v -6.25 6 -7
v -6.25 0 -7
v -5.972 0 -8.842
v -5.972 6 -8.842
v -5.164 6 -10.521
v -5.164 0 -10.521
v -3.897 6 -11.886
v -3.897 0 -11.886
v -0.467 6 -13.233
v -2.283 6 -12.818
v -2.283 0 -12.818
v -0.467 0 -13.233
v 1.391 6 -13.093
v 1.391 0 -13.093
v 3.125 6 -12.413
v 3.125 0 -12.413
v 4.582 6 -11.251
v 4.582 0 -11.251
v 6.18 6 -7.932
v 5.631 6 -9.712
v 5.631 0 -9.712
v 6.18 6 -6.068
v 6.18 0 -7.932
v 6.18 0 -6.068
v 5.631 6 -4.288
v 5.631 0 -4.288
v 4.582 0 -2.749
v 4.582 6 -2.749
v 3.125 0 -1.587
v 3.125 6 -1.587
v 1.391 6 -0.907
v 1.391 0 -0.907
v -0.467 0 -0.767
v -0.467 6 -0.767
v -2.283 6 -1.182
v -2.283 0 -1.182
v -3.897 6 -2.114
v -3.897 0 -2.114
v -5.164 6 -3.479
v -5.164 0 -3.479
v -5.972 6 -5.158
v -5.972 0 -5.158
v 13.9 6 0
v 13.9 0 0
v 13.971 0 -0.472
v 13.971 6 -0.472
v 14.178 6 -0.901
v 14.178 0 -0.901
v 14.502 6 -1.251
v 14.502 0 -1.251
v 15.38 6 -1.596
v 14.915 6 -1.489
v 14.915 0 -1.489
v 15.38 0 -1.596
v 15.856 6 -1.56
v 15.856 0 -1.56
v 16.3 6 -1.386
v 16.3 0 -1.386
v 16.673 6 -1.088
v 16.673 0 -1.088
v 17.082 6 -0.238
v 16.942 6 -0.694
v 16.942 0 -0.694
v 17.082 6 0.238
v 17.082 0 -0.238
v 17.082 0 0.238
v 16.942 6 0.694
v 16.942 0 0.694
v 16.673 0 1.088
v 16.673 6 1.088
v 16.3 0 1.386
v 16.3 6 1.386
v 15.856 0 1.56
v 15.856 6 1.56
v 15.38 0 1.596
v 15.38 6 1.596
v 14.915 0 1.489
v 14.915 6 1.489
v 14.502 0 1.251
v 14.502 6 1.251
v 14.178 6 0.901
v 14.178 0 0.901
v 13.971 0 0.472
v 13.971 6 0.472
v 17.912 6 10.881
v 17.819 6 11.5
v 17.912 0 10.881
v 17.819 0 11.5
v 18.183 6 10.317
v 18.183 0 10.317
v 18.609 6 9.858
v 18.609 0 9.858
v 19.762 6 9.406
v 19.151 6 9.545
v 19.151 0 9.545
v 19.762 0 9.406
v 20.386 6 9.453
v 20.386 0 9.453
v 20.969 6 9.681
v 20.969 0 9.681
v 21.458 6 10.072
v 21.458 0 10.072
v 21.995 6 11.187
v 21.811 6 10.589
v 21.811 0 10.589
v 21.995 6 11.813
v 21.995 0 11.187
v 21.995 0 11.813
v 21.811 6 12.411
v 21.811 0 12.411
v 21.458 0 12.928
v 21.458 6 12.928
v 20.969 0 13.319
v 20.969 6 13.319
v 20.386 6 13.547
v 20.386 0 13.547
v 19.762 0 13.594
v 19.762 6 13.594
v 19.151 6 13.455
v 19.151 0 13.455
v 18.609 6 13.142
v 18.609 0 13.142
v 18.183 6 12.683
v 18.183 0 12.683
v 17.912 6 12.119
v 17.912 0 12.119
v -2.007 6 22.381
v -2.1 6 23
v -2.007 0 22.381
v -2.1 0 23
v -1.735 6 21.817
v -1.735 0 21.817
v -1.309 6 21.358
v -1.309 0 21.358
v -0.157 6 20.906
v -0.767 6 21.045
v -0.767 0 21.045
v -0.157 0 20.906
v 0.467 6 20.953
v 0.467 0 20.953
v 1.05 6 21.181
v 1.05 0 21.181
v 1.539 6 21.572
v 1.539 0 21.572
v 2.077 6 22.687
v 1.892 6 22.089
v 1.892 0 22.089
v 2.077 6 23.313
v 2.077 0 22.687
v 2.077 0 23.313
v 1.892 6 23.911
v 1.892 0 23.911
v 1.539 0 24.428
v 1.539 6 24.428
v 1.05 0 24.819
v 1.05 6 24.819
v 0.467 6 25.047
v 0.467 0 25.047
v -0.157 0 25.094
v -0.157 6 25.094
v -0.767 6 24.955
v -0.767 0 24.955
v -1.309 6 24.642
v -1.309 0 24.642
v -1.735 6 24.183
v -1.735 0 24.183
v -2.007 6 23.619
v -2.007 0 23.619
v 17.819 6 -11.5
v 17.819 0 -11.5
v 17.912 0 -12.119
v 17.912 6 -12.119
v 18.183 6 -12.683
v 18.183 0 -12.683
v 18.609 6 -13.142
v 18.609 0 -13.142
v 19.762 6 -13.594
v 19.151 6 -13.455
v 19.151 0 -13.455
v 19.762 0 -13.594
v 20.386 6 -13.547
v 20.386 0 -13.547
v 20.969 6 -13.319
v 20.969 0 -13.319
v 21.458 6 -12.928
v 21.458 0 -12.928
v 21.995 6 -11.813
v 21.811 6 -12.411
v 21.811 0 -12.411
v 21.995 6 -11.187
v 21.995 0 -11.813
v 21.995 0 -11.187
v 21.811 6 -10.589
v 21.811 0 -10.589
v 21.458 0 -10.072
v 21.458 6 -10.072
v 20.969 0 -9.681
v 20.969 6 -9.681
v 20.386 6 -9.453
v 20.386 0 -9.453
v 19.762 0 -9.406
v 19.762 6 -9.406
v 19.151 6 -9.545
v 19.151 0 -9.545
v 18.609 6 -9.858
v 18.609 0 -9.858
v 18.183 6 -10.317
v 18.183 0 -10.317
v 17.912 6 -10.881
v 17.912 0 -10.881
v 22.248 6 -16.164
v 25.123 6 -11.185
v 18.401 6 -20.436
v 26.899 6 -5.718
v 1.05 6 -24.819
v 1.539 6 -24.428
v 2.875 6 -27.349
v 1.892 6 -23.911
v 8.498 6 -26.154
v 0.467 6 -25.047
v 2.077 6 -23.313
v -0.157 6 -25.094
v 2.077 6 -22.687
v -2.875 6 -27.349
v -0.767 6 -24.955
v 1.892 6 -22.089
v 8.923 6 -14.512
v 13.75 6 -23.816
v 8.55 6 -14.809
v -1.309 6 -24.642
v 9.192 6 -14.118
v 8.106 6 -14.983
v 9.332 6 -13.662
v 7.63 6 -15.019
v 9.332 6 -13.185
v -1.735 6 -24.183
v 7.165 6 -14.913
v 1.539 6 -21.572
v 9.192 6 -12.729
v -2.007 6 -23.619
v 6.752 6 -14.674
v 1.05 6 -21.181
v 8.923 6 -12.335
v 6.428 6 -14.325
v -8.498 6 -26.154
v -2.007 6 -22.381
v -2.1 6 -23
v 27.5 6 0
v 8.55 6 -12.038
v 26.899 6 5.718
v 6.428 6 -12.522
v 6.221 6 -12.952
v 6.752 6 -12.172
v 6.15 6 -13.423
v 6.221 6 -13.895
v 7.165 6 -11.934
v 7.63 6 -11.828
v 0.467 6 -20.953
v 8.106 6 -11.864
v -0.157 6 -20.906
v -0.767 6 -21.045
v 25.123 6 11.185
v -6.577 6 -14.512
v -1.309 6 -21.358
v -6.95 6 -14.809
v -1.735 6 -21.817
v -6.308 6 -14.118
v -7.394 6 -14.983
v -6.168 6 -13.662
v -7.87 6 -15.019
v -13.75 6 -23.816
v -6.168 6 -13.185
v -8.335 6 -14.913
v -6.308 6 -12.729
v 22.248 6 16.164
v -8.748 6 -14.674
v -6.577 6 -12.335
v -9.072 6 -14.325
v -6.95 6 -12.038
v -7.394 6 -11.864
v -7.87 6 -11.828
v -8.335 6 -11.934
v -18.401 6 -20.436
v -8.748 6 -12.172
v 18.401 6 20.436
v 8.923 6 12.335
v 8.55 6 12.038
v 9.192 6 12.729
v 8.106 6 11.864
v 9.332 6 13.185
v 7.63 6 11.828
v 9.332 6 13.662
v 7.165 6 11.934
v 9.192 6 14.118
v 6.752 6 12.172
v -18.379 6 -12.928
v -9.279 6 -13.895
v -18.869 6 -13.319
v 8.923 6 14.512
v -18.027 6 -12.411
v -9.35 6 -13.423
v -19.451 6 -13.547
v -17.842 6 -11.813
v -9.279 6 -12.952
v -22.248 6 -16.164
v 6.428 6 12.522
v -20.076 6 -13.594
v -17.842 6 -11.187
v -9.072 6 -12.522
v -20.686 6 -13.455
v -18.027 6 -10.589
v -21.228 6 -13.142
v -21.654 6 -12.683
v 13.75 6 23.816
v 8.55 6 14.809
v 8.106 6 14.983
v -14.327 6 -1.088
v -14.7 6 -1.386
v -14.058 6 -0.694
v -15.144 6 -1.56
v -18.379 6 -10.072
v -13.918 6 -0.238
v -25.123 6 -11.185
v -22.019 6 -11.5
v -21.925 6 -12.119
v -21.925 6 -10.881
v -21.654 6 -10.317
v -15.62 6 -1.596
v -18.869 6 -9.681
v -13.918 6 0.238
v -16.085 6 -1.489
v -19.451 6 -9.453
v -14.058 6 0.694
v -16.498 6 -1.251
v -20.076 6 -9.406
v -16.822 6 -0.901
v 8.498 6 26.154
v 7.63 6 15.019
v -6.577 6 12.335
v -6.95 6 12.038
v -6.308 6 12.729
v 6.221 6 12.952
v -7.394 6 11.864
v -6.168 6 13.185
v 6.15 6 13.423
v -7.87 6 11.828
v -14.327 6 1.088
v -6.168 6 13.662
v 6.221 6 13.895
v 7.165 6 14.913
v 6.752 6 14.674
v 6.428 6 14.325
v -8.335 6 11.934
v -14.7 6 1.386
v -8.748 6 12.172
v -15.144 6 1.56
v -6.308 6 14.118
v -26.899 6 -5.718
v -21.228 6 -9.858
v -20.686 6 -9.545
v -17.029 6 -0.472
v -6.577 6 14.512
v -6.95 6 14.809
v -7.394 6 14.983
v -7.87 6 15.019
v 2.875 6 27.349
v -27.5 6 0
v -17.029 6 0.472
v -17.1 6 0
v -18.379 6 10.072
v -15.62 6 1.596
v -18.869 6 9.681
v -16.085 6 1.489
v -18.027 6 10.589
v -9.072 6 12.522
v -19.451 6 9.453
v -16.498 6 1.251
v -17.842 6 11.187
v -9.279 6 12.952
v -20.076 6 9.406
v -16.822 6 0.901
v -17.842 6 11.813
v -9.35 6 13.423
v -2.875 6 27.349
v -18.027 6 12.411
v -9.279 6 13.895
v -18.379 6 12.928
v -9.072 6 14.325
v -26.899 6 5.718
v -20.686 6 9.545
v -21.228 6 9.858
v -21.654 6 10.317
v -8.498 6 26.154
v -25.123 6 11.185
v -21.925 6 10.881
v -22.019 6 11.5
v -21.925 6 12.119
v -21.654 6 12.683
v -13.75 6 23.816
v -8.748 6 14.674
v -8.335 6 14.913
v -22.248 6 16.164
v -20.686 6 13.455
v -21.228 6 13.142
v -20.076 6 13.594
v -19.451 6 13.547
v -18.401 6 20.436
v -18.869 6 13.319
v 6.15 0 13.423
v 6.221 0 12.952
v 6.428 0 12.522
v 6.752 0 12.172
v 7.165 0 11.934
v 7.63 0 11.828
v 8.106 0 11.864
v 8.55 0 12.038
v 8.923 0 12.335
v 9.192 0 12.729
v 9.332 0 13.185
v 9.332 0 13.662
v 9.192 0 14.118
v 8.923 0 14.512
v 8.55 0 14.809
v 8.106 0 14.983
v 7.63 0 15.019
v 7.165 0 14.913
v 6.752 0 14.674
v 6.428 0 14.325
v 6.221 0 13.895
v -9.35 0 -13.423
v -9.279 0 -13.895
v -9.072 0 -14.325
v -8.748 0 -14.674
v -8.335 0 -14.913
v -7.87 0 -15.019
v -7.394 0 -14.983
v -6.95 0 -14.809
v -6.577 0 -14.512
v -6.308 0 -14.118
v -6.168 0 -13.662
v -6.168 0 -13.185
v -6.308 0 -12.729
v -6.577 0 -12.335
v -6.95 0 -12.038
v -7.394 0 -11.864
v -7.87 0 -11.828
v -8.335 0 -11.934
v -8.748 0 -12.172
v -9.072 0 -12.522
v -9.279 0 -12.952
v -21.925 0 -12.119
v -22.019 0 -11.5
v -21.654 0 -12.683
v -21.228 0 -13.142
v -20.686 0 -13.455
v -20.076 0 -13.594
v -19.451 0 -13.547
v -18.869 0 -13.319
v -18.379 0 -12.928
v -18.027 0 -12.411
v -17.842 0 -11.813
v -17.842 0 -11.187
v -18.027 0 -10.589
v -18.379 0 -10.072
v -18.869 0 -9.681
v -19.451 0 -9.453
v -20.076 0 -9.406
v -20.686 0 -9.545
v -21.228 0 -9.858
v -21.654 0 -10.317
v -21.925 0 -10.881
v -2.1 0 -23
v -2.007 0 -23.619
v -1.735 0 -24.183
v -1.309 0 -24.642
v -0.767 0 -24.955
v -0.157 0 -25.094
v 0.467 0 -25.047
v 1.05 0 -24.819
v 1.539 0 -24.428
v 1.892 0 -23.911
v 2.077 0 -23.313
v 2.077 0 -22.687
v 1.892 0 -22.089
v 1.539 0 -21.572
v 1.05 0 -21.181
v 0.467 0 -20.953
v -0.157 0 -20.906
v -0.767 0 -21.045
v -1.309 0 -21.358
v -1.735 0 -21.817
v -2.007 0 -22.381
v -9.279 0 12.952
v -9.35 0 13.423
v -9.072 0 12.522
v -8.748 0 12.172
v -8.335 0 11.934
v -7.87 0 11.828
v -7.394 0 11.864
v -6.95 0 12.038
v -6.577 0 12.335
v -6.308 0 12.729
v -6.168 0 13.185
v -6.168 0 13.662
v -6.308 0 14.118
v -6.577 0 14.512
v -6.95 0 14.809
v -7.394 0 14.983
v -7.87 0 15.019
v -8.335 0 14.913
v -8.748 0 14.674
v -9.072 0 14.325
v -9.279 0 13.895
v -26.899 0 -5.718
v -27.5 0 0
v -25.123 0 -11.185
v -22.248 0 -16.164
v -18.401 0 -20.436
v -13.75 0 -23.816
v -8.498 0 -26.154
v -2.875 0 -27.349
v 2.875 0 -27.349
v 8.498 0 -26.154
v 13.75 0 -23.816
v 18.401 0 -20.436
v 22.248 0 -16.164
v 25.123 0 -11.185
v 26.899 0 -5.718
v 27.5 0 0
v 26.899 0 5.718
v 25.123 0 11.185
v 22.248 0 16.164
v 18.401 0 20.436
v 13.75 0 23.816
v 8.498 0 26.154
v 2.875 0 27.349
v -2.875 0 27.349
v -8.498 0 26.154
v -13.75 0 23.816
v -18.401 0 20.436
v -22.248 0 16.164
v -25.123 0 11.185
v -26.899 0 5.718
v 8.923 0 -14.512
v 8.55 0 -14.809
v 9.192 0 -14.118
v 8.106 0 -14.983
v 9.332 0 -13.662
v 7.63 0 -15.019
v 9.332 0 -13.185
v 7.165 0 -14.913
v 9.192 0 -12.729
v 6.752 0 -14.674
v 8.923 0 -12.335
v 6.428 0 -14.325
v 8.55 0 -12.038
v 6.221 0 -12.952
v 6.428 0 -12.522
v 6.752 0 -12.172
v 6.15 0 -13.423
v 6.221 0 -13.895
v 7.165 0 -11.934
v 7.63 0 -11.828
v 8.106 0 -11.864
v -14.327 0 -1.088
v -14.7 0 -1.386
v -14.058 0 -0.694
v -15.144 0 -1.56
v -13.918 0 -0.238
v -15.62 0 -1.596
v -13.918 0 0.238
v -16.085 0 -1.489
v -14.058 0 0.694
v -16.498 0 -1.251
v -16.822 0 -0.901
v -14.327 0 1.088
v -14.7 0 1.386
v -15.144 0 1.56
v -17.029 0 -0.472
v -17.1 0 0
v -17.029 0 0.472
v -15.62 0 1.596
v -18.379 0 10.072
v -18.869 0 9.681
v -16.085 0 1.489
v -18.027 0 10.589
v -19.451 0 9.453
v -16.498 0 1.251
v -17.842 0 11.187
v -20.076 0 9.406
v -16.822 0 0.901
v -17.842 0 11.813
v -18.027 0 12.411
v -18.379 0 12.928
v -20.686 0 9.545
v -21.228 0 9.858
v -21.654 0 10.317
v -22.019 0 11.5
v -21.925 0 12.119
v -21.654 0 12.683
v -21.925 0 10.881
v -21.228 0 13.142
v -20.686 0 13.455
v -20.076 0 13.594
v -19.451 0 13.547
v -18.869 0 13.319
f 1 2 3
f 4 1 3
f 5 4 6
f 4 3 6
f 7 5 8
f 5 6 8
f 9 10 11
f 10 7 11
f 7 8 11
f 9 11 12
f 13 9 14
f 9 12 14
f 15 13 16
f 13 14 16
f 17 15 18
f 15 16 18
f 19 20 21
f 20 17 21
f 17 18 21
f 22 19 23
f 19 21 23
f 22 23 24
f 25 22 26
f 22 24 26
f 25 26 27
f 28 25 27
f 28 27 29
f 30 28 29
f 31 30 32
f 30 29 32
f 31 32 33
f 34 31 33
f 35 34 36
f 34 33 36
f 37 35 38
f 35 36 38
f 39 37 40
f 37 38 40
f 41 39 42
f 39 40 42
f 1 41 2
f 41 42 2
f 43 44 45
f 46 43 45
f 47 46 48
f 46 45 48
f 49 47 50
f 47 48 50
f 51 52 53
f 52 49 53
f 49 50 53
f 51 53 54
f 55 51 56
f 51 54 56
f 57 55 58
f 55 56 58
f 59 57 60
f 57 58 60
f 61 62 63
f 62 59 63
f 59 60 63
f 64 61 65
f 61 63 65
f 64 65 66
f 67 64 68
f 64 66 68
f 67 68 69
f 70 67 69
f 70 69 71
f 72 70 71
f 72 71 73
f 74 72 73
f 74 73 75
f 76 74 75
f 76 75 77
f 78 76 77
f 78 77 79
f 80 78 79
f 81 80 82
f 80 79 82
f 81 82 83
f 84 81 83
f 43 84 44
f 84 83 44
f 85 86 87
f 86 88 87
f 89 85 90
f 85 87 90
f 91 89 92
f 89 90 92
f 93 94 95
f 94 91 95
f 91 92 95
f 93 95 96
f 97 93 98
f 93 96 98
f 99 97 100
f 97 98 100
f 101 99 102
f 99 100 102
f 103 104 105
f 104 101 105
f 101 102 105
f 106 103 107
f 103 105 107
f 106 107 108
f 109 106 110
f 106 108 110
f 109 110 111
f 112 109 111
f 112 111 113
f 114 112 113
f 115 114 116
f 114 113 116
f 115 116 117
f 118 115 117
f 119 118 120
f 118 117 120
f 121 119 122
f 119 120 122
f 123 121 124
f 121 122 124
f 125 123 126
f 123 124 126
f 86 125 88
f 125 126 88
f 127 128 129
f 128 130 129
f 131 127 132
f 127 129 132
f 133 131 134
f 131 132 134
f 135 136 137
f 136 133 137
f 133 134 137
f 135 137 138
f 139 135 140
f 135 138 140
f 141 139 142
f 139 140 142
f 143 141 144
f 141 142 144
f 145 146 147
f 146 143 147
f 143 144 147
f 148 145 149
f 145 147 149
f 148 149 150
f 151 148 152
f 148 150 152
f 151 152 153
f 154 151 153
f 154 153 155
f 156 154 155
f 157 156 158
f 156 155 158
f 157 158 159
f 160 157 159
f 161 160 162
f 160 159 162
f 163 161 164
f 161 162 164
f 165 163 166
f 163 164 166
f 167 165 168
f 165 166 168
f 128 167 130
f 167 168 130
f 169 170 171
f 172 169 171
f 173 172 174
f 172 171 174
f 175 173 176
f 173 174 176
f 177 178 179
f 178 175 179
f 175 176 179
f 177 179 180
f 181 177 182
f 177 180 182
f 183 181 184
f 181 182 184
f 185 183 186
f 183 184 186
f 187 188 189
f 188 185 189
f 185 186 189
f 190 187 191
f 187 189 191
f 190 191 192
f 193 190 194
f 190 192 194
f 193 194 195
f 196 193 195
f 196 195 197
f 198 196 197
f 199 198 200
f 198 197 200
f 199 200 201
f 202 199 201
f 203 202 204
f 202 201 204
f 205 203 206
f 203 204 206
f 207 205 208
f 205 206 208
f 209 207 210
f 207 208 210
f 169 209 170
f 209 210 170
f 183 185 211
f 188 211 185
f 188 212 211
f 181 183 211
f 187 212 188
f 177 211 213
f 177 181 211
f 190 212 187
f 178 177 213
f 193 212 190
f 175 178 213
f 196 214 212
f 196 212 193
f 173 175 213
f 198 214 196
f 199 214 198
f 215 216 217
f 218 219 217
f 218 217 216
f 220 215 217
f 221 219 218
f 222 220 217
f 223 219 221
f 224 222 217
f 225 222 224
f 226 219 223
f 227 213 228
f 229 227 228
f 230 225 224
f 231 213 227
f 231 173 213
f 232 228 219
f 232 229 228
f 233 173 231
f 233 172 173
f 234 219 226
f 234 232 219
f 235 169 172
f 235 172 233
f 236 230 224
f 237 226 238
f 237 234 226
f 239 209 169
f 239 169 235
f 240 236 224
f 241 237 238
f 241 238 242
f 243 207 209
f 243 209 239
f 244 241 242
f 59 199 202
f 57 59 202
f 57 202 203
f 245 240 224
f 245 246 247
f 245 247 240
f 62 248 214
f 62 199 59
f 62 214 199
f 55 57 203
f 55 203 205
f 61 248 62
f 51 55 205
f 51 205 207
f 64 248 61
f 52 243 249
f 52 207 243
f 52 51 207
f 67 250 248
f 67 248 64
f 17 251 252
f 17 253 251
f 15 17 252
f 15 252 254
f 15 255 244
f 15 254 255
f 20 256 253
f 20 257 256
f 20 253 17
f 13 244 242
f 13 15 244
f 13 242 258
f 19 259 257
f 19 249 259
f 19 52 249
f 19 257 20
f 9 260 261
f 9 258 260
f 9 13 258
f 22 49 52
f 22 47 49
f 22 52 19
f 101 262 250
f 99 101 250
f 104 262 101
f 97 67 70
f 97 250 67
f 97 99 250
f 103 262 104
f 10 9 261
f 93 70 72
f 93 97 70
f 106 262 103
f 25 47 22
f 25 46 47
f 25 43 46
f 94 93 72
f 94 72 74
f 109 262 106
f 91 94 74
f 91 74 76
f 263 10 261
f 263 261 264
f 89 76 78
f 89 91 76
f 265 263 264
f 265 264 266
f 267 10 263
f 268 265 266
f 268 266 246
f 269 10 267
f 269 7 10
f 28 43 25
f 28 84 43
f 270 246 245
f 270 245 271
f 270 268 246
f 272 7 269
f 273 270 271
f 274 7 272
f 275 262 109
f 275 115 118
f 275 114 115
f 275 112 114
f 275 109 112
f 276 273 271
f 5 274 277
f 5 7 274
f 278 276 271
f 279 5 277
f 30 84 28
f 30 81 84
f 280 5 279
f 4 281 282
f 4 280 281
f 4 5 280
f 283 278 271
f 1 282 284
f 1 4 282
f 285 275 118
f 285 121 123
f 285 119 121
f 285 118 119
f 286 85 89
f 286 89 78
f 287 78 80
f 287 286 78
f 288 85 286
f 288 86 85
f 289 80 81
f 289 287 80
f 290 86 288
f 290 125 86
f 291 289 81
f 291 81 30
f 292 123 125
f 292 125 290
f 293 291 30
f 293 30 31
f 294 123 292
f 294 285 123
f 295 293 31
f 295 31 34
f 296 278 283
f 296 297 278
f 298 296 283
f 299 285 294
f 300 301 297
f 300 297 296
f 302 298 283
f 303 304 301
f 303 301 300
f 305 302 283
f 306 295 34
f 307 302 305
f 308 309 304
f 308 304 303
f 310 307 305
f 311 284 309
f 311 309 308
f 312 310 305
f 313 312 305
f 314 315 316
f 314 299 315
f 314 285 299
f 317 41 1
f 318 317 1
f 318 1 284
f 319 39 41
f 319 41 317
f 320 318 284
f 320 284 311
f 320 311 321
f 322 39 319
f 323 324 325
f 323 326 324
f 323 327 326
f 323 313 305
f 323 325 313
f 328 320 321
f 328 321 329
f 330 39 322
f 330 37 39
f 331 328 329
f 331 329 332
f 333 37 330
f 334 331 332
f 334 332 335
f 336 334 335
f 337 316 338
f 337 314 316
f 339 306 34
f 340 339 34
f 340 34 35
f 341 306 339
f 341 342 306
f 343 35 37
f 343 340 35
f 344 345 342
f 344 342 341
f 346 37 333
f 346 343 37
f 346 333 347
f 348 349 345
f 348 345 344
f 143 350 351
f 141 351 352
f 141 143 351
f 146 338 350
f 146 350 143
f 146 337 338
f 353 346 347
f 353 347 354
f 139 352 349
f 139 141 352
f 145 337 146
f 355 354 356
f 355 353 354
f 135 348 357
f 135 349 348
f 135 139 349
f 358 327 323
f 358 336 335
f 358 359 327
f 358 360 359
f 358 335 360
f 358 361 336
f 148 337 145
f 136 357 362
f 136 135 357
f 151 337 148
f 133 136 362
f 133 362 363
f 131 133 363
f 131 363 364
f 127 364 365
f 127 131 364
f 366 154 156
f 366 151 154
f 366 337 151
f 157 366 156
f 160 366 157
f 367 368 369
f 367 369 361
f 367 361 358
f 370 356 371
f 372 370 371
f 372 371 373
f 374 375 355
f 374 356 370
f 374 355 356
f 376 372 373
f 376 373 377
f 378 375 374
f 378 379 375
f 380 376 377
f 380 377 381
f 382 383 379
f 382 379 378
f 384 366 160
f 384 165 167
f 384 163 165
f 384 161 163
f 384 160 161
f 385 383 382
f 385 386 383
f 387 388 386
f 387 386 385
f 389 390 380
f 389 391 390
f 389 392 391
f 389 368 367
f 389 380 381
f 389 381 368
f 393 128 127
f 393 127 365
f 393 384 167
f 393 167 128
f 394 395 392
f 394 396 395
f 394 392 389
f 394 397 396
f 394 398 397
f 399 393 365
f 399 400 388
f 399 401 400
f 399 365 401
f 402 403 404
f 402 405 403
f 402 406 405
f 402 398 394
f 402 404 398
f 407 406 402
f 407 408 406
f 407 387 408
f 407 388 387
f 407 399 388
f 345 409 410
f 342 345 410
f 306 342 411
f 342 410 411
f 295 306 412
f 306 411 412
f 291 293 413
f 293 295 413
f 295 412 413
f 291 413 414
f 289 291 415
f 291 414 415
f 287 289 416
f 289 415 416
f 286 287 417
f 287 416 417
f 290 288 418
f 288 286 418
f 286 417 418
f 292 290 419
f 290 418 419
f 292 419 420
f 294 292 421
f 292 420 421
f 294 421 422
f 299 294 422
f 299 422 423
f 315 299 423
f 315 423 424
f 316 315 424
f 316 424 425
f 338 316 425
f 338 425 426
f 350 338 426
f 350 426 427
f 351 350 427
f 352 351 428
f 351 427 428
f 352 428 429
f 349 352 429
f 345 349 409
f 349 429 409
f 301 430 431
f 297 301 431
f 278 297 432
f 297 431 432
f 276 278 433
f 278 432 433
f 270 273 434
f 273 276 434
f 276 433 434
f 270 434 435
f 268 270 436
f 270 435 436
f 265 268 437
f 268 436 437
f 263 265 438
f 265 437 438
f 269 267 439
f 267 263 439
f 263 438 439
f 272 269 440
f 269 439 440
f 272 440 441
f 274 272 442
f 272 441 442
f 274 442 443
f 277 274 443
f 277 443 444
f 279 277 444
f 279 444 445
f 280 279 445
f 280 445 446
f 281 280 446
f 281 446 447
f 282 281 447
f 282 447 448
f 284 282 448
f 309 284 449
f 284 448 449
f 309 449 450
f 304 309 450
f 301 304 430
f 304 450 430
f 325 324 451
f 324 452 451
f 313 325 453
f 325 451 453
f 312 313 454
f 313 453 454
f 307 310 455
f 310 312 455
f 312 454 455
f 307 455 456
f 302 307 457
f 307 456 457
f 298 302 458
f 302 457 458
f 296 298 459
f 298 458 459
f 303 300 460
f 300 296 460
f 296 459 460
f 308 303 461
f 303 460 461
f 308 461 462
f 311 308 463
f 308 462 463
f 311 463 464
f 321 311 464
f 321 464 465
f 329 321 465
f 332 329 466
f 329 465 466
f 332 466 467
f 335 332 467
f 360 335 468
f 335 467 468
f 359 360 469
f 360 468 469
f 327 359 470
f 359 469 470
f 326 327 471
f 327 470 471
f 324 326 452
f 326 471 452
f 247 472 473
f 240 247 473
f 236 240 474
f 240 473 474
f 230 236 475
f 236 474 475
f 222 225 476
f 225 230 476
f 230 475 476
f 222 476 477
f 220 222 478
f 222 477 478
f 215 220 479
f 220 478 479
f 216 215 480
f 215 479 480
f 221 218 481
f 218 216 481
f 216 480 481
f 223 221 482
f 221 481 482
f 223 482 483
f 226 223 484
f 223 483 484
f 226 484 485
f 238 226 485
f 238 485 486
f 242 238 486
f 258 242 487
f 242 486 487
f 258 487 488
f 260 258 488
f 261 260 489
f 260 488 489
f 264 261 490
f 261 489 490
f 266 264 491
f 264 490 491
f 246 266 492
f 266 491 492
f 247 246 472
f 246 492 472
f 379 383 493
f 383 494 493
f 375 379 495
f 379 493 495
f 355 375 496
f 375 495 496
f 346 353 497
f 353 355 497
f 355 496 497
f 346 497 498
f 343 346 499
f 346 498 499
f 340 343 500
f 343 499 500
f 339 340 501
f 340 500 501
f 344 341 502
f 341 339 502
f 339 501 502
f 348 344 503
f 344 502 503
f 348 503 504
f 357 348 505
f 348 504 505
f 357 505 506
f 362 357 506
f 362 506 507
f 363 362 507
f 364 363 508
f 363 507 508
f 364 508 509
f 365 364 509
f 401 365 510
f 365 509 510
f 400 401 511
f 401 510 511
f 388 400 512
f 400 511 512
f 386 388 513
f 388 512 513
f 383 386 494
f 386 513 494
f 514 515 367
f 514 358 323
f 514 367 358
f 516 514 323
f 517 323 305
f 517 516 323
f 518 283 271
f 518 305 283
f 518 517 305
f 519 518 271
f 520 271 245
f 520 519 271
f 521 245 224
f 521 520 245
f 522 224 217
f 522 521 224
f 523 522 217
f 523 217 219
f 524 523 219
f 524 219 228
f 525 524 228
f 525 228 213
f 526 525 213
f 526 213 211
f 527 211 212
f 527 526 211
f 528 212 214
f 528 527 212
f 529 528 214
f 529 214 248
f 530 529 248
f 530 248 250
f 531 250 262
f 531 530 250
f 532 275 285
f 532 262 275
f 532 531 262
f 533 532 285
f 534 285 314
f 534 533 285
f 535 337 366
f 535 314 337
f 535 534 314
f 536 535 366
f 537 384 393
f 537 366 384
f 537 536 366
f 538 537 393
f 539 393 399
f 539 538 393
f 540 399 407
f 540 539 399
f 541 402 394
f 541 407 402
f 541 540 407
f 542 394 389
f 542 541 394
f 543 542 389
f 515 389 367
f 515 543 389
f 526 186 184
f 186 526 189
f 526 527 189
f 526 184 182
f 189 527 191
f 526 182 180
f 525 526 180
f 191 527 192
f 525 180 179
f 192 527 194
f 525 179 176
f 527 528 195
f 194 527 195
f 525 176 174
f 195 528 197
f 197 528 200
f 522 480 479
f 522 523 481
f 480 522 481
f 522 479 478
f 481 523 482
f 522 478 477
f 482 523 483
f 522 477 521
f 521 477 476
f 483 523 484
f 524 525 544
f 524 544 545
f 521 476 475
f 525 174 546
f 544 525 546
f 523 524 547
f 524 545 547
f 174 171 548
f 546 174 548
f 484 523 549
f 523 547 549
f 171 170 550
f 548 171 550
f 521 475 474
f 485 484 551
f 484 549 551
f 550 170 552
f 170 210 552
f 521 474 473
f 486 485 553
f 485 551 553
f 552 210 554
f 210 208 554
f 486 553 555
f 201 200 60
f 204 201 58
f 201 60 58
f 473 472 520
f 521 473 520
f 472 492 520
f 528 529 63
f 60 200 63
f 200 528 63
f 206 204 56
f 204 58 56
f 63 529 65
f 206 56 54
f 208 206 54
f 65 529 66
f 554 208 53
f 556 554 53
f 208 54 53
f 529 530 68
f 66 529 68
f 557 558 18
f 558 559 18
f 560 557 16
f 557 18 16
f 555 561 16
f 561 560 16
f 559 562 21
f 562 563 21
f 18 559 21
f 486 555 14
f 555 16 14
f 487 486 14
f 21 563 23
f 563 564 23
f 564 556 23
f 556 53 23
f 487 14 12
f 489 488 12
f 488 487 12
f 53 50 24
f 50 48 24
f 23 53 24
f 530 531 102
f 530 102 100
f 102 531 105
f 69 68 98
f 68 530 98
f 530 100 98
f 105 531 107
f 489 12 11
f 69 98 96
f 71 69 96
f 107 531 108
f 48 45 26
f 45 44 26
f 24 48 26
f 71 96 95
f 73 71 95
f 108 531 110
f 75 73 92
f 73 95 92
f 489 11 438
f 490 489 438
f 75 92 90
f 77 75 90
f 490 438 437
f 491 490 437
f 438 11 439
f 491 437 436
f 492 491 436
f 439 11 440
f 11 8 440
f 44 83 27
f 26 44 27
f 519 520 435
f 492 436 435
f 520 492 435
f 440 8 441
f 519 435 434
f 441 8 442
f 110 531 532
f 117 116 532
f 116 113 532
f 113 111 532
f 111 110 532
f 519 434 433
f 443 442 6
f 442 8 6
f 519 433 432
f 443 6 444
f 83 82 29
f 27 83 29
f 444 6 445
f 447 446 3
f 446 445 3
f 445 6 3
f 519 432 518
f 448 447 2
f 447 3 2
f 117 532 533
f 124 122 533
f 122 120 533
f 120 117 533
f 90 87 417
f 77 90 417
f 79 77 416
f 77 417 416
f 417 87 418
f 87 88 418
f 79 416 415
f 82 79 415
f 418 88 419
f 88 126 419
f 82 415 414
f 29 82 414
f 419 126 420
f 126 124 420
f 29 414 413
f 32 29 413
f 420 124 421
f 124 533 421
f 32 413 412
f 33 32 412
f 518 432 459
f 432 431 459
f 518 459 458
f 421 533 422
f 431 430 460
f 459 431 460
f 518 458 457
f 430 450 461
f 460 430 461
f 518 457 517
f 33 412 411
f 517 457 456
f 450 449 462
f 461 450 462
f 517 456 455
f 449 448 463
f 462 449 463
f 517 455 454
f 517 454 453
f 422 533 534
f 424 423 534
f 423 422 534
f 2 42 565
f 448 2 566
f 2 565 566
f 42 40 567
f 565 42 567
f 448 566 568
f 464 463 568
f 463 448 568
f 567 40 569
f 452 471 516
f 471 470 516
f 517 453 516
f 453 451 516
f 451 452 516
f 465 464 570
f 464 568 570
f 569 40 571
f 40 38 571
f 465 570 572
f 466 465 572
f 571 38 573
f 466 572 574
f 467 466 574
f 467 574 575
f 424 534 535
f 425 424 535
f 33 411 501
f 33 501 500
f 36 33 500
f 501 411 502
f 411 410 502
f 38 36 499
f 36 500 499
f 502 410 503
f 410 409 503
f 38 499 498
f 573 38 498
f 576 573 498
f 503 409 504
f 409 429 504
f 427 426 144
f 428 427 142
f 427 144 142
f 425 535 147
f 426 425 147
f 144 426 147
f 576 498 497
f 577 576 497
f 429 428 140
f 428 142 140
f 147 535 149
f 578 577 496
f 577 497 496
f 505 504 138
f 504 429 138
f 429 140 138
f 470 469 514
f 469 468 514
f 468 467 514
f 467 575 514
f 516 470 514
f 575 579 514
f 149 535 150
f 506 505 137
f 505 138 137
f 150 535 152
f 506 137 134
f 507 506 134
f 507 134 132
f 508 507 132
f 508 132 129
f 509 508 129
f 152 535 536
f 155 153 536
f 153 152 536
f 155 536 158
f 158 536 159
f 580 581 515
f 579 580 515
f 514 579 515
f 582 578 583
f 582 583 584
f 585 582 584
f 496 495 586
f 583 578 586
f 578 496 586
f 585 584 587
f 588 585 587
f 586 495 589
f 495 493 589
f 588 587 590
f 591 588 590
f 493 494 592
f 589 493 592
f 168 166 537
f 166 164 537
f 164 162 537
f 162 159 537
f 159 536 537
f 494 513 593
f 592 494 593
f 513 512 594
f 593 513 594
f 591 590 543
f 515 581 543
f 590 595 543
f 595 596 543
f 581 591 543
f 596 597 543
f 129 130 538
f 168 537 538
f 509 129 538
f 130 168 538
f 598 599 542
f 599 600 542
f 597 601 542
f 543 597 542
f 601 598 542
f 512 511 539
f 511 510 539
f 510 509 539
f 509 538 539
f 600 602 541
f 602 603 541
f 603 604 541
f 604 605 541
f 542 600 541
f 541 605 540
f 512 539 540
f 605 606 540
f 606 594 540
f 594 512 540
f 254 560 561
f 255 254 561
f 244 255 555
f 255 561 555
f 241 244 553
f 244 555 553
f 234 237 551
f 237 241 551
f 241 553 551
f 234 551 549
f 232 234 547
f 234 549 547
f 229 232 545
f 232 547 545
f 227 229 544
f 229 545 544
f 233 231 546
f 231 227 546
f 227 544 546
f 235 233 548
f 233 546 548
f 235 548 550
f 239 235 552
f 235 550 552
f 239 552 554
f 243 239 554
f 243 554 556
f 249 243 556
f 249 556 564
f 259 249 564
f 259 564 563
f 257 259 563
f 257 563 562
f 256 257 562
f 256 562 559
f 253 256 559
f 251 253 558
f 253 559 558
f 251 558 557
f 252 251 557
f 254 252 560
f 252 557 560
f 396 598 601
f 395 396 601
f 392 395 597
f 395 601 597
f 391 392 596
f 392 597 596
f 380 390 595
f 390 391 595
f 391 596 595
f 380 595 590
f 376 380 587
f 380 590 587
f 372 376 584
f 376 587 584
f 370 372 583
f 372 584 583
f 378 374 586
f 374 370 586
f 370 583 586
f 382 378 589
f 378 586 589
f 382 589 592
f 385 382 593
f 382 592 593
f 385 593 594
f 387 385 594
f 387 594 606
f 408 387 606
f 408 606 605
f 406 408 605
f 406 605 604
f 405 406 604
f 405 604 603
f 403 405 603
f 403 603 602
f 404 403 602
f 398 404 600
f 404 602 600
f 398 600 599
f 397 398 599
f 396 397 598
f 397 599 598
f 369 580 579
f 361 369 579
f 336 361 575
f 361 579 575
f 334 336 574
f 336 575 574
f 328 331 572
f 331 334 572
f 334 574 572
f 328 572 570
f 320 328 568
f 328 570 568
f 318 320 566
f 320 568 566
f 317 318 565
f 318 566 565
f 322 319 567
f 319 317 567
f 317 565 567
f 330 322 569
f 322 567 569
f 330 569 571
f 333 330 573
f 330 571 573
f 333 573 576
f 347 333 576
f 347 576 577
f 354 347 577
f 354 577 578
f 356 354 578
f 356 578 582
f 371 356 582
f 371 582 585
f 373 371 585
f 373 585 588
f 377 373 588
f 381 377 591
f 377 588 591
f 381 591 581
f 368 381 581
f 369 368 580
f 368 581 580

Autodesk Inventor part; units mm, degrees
ref_plane "YZ Plane" through (0, 0, 0) normal (1, 0, 0) x (0, 1, 0)
ref_plane "XZ Plane" through (0, 0, 0) normal (0, 1, 0) x (-1, 0, 0)
ref_plane "XY Plane" through (0, 0, 0) normal (0, 0, 1) x (1, 0, 0)
sketch "Sketch1" plane through (0, 0, 0) normal (0, 1, 0) x (-1, 0, 0)
  circle A0 centre (0, 0) radius 27.5
  circle A1 centre (0, -7) radius 6.25
  circle A2 centre (15.5, 0) radius 1.6
  circle A3 centre (7.75, 13.4234) radius 1.6
  circle A4 centre (-7.75, 13.4234) radius 1.6
  circle A5 centre (-15.5, 0) radius 1.6
  circle A6 centre (-7.75, -13.4234) radius 1.6
  circle A7 centre (7.75, -13.4234) radius 1.6
  circle A8 centre (0, 23) radius 2.1
  circle A9 centre (-19.9186, 11.5) radius 2.1
  circle A10 centre (-19.9186, -11.5) radius 2.1
  circle A11 centre (0, -23) radius 2.1
  circle A12 centre (19.9186, -11.5) radius 2.1
  circle A13 centre (19.9186, 11.5) radius 2.1
  dimension "d0" = 55
  dimension "d1" = 12.5
  dimension "d2" = 7
  dimension "d3" = 3.2
  dimension "d4" = 15.5
  dimension "d7" = 360
  dimension "d9" = 4.2
  dimension "d10" = 23
  dimension "d13" = 360
extrude "Extrusion1" add sketch "Sketch1" along normal blind 6
properties part number "motor_mounting_plate"
